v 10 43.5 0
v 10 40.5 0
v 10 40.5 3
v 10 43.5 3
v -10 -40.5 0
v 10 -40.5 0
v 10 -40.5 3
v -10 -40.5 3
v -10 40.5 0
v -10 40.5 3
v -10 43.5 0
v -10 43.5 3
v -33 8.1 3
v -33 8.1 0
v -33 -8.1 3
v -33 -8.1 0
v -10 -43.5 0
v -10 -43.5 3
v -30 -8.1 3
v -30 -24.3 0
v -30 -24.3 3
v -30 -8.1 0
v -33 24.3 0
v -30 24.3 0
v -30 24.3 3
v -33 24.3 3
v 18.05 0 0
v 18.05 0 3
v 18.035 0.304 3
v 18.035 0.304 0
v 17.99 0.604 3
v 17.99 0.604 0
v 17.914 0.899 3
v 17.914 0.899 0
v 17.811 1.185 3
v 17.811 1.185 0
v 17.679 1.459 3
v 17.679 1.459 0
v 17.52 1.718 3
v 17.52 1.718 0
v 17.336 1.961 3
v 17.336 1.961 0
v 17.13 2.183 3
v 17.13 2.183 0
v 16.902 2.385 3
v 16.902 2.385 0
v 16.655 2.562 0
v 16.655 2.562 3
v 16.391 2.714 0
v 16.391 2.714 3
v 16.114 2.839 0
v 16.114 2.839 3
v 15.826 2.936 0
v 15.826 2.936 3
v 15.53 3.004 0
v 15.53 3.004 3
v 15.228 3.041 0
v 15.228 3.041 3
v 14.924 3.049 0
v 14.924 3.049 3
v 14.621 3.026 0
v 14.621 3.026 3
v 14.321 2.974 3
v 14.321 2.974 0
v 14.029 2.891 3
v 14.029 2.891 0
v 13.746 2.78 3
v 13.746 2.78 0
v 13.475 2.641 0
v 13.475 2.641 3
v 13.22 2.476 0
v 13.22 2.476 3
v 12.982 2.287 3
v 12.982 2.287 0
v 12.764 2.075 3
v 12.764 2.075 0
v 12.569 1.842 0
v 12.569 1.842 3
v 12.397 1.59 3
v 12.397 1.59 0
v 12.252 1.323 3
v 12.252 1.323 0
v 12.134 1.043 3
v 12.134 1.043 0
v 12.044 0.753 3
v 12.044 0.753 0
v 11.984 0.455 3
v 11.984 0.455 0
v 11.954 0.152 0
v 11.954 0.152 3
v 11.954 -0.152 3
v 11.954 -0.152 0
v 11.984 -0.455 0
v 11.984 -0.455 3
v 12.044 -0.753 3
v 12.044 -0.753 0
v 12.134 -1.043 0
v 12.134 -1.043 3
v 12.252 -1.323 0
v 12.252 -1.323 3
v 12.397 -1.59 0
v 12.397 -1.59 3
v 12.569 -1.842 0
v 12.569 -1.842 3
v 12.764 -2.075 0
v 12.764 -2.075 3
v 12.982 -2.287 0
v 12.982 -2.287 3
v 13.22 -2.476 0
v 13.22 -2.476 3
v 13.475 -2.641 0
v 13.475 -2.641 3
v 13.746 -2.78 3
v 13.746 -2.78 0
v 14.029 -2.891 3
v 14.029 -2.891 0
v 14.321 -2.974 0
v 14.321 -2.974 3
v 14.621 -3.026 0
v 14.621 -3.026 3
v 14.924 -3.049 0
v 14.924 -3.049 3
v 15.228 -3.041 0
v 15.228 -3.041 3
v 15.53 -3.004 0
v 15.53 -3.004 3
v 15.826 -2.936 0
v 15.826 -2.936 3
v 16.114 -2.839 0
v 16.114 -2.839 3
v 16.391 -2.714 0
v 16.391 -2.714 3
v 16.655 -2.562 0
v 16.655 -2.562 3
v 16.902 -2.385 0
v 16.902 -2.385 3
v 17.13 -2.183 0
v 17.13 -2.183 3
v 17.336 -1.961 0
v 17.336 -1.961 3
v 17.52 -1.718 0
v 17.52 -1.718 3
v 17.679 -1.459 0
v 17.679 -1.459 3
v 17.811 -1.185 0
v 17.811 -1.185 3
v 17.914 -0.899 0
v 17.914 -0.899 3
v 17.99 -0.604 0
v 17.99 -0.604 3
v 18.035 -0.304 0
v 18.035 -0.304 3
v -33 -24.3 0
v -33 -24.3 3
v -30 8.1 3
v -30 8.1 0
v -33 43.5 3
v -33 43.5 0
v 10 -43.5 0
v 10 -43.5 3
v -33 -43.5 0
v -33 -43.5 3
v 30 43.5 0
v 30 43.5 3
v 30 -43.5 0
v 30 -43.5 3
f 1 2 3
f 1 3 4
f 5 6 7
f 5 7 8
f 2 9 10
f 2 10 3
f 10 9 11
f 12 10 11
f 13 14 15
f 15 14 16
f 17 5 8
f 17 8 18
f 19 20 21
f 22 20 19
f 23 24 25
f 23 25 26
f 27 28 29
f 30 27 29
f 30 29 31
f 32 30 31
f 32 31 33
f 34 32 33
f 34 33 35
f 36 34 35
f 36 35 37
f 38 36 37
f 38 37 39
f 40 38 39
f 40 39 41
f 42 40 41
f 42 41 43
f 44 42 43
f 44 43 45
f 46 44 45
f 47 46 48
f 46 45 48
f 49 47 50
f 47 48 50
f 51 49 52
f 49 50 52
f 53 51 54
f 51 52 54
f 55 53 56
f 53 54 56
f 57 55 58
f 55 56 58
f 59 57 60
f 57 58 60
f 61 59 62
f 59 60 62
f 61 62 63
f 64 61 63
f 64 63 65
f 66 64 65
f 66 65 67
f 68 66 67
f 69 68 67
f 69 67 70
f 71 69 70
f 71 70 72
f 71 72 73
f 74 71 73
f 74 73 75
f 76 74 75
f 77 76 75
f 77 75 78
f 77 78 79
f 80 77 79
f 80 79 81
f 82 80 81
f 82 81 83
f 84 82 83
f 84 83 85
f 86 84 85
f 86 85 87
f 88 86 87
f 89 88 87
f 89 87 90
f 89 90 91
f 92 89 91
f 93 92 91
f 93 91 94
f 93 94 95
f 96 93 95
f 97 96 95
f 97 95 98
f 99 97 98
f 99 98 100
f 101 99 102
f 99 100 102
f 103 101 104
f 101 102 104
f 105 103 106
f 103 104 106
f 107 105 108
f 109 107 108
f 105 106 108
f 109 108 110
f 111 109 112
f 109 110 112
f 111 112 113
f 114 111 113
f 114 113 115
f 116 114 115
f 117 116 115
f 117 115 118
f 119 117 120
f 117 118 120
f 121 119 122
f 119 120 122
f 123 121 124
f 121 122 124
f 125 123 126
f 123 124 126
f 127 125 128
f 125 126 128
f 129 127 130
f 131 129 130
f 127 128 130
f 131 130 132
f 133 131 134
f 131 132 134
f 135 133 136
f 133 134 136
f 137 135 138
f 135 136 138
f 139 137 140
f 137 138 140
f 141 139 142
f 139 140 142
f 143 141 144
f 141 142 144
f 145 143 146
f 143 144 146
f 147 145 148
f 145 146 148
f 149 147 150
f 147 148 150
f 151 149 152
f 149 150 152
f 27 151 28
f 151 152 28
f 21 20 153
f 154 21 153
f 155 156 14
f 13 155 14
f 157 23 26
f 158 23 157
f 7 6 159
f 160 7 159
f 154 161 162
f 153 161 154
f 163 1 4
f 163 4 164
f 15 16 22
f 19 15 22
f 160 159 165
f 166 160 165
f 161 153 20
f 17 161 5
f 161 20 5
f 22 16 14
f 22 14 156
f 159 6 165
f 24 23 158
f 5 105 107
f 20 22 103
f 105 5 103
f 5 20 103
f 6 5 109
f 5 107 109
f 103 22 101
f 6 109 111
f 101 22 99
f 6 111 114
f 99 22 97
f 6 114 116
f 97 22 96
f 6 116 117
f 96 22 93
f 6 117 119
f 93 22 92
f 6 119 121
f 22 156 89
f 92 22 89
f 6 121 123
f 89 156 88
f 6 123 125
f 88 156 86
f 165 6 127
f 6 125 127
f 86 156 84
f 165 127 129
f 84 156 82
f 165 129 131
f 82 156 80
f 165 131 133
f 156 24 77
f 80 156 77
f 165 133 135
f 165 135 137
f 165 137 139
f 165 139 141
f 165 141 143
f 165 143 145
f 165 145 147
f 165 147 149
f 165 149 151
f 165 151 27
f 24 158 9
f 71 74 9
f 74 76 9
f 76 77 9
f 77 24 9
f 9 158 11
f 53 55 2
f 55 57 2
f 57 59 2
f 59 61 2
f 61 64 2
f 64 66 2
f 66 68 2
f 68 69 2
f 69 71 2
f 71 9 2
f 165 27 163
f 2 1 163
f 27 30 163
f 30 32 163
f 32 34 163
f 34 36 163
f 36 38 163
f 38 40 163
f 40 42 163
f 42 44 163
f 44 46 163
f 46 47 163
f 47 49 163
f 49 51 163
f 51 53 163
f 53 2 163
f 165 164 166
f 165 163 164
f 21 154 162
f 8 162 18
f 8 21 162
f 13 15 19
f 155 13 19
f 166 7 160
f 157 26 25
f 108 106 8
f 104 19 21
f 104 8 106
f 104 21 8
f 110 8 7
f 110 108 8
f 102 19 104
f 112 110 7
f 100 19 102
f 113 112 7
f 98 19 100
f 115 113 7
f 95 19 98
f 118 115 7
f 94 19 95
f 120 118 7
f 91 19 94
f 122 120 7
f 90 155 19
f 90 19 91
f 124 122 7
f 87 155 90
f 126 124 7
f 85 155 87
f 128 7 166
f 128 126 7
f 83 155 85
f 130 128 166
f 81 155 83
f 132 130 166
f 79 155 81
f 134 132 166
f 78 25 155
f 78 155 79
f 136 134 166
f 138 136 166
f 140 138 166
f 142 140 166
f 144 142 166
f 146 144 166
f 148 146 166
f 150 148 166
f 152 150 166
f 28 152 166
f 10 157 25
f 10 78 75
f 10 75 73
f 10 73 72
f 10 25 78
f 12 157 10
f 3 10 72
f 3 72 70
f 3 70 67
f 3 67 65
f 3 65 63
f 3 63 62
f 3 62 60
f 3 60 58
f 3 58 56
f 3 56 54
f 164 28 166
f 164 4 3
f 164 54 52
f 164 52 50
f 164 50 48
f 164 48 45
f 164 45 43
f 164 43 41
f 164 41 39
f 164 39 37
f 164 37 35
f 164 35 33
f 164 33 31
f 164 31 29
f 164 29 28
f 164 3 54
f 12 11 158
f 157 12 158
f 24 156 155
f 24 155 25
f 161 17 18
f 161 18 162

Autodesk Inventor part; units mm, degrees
ref_plane "YZ Plane" through (0, 0, 0) normal (1, 0, 0) x (0, 1, 0)
ref_plane "XZ Plane" through (0, 0, 0) normal (0, 1, 0) x (-1, 0, 0)
ref_plane "XY Plane" through (0, 0, 0) normal (0, 0, 1) x (1, 0, 0)
sketch "Sketch1" plane through (0, 0, 0) normal (0, 0, 1) x (1, 0, 0)
  line L0 (-30, -40.5) -> (-30, 40.5)
  line L1 (-30, 40.5) -> (30, 40.5)
  line L2 (30, 40.5) -> (30, -40.5)
  line L3 (30, -40.5) -> (-30, -40.5)
  line L4 (-30, -40.5) -> (30, 40.5) construction
  line L5 (-30, 40.5) -> (30, -40.5) construction
  line L6 (-30, 40.5) -> (-10, 40.5)
  line L7 (-10, 40.5) -> (-10, 43.5)
  line L8 (-10, 43.5) -> (-30, 43.5)
  line L9 (-30, 43.5) -> (-30, 40.5) construction
  line L10 (30, 40.5) -> (10, 40.5)
  line L11 (10, 40.5) -> (10, 43.5)
  line L12 (10, 43.5) -> (30, 43.5)
  line L13 (30, 43.5) -> (30, 40.5)
  line L14 (-45.6, 0) -> (42.6, 0) projected
  line L15 (0, -60.9) -> (0, 60.9) projected
  line L16 (-10, -40.5) -> (-10, -43.5)
  line L17 (-10, -43.5) -> (-30, -43.5)
  line L18 (-30, -43.5) -> (-30, -40.5) construction
  line L19 (10, -40.5) -> (10, -43.5)
  line L20 (10, -43.5) -> (30, -43.5)
  line L21 (30, -43.5) -> (30, -40.5)
  line L22 (-30, -40.5) -> (-30, -24.3)
  line L23 (-30, -24.3) -> (-33, -24.3)
  line L24 (-33, -24.3) -> (-33, -40.5)
  line L25 (-33, -40.5) -> (-30, -40.5) construction
  line L26 (-30, -8.1) -> (-30, 8.1)
  line L27 (-30, 8.1) -> (-33, 8.1)
  line L28 (-33, 8.1) -> (-33, -8.1)
  line L29 (-33, -8.1) -> (-30, -8.1)
  line L30 (-30, 40.5) -> (-30, 24.3)
  line L31 (-30, 24.3) -> (-33, 24.3)
  line L32 (-33, 24.3) -> (-33, 40.5)
  line L33 (-33, 40.5) -> (-30, 40.5) construction
  line L34 (-30, 43.5) -> (-33, 43.5)
  line L35 (-33, 43.5) -> (-33, 40.5)
  line L36 (-30, -43.5) -> (-33, -43.5)
  line L37 (-33, -43.5) -> (-33, -40.5)
  point P0 (0, 0)
  point P1 (20, 43.5)
  point P2 (-20, 43.5)
  point P3 (20, -43.5)
  point P4 (-20, -43.5)
  point P5 (-33, 32.4)
  point P6 (-33, 0)
  point P7 (-33, -32.4)
  point P8 (-30, 0)
  dimension "d0" = 81
  dimension "d1" = 60
  dimension "d4" = 20
  dimension "d5" = 20
  dimension "d6" = 3
  dimension "d7" = 3
  dimension "d8" = 16.2
extrude "Extrusion1" add sketch "Sketch1" along normal blind 3
sketch "Sketch2" plane through (0, 0, 3) normal (0, 0, 1) x (1, 0, 0)
  line L0 (-45.6, 0) -> (42.6, 0) projected
  line L1 (0, -60.9) -> (0, 60.9) projected
  circle A0 centre (15, 0) radius 3.05
  line L2 (30, -43.5) -> (30, 43.5) projected
  dimension "d9" = 6.1
  dimension "d12" = 15
extrude "Extrusion2" cut sketch "Sketch2" against normal through all
equation "\"d4\" = 0.333333 * d1"
equation "\"d5\" = d4"
equation "\"d6\" = d2"
equation "\"d7\" = d2"
equation "\"d8\" = 0.2 * d0"
equation "\"d2\" = 3"
properties part number "top switch"
